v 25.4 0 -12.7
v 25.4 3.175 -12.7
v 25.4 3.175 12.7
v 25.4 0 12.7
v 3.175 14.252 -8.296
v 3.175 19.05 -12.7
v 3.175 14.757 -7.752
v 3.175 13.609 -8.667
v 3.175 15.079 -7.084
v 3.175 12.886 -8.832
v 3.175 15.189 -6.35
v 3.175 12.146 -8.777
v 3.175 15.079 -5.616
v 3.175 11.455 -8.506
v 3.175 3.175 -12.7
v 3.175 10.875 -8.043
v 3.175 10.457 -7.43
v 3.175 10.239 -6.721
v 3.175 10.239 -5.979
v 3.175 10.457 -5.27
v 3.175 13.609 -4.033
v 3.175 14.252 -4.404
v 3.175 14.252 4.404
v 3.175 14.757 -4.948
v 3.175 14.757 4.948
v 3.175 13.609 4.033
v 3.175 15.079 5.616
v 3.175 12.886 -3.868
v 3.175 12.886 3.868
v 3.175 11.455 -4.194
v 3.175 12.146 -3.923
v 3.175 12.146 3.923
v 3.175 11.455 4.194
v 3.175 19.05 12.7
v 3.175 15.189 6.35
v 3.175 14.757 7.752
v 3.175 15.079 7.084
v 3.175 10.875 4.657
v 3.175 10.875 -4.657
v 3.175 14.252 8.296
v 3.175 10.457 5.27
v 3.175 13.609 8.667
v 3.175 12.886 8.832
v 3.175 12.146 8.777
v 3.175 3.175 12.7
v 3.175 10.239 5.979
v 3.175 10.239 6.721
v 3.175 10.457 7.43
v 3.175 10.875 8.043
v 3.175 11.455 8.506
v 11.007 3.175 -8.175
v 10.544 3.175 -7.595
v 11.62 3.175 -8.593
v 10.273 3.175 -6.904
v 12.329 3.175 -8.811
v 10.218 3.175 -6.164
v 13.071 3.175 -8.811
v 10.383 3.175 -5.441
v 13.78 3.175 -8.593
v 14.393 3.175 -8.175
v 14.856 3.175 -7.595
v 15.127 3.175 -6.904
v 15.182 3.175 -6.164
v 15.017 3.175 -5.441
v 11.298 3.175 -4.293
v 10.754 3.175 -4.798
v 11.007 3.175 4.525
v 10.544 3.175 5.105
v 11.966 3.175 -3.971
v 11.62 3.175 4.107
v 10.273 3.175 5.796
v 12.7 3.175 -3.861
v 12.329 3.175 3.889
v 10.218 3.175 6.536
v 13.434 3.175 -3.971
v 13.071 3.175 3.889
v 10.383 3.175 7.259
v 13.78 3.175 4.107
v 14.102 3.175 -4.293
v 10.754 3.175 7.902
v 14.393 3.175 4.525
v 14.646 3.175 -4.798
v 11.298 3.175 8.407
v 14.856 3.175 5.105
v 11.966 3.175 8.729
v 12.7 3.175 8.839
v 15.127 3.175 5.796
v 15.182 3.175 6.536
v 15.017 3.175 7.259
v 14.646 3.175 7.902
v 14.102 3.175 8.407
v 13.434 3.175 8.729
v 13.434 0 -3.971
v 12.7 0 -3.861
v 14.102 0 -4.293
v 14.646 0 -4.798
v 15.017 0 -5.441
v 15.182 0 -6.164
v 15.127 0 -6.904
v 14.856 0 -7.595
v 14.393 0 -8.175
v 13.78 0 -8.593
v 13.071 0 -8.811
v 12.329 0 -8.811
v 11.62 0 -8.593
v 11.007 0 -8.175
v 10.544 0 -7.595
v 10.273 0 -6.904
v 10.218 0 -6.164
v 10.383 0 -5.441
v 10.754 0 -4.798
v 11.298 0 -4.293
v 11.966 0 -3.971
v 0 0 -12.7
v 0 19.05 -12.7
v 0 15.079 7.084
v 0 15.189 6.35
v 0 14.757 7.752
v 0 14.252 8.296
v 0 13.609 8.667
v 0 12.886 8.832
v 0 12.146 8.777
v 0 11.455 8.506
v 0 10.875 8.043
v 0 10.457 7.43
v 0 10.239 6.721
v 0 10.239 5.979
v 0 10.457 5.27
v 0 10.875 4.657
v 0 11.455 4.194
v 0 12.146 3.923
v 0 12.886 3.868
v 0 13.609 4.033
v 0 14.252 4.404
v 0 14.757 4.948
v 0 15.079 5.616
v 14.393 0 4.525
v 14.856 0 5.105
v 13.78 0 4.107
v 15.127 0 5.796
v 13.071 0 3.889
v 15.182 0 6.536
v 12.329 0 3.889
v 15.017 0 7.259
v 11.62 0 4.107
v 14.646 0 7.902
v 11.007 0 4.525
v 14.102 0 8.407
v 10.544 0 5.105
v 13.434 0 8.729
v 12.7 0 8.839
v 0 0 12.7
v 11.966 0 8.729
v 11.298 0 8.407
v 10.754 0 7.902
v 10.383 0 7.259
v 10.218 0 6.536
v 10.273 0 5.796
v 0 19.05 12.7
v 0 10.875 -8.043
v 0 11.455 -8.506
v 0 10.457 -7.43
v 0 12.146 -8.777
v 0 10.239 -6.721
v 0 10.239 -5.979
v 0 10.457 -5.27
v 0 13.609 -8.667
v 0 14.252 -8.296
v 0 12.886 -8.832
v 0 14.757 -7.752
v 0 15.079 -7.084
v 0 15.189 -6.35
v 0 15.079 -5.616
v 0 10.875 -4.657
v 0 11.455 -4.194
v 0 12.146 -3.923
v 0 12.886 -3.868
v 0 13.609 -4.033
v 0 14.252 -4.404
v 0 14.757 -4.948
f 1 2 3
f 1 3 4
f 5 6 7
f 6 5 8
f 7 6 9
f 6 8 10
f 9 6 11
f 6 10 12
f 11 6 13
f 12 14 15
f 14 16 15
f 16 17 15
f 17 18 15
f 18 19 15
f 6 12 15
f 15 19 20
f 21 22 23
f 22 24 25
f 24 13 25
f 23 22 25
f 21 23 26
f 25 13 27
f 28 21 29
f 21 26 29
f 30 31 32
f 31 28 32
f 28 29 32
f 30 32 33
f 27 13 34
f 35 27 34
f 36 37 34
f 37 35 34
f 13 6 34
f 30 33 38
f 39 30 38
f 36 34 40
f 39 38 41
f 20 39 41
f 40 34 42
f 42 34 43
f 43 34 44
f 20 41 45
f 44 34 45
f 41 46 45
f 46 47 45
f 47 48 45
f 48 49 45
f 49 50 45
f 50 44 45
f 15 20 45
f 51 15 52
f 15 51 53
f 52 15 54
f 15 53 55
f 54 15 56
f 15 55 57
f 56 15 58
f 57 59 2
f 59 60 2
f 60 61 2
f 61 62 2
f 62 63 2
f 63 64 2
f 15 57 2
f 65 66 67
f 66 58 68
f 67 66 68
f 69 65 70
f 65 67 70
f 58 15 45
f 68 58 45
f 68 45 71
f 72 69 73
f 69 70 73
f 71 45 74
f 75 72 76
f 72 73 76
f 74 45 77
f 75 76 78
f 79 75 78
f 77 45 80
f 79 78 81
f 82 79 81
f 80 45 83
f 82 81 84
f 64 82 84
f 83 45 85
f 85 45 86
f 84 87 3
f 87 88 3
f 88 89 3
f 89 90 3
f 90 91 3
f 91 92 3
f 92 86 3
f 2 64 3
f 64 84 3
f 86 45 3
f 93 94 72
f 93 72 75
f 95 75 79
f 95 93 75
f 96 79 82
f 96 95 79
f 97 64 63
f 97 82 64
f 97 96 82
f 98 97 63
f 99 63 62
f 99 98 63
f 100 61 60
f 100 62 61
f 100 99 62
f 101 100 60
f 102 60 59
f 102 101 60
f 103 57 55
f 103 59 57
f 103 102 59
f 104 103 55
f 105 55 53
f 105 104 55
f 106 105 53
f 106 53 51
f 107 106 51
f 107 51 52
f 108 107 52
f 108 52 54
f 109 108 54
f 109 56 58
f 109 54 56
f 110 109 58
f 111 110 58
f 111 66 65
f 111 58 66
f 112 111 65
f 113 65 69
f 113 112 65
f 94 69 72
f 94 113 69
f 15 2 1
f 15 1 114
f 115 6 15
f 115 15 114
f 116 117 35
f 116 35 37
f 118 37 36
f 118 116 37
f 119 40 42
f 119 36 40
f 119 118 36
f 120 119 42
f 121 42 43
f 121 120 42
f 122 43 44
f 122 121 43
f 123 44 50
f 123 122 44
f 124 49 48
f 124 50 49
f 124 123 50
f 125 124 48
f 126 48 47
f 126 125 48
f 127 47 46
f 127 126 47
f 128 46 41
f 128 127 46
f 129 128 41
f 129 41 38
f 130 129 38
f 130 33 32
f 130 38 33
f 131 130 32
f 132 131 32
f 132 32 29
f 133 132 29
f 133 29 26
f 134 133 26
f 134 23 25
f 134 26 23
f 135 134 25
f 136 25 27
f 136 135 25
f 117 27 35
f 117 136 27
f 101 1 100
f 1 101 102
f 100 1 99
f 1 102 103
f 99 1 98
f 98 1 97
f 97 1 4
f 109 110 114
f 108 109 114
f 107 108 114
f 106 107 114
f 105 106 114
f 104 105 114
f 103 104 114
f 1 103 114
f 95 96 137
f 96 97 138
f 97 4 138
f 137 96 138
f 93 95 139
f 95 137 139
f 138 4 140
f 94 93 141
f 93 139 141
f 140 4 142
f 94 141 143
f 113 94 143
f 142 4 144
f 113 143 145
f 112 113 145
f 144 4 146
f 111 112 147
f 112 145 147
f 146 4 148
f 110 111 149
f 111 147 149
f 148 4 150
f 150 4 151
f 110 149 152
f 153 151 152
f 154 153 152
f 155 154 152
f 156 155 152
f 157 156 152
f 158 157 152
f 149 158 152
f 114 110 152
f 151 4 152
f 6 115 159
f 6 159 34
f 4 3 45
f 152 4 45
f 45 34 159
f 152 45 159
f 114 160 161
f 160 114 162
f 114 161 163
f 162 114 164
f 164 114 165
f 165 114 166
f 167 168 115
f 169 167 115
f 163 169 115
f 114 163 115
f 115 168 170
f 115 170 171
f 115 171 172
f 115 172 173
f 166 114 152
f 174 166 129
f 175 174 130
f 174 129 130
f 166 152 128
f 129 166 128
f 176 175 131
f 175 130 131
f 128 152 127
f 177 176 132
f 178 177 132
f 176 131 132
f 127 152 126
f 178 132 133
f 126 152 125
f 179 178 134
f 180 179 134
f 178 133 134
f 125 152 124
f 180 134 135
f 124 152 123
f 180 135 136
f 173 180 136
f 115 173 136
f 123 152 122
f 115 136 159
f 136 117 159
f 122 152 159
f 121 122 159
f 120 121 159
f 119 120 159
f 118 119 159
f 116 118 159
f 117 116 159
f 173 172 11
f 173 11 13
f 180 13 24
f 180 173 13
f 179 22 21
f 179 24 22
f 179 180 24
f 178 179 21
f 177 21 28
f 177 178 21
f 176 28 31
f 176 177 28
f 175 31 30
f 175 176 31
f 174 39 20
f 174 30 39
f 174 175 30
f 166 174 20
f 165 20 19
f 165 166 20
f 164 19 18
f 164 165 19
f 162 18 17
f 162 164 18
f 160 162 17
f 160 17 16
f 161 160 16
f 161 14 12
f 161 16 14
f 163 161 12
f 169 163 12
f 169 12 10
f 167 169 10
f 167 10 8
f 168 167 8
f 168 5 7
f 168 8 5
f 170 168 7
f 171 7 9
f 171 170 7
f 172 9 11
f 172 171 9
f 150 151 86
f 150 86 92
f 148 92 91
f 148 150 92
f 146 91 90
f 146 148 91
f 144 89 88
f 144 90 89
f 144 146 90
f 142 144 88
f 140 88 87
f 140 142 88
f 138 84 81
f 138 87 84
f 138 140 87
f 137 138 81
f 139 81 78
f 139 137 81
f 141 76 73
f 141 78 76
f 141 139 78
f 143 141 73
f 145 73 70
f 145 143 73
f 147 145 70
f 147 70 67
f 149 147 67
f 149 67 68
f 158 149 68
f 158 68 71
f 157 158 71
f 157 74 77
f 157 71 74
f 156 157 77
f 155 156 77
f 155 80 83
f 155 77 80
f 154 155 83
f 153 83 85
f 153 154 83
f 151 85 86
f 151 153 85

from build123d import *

# Parameters (mm, degrees)
BOSS_EXTRUDE1_DEPTH     = 12.7
CUT_EXTRUDE1_DEPTH      = 33.534068682
CUT_EXTRUDE1_DEPTH_BACK = 33.534068682
SKETCH3_R               = 2.4892
CUT_EXTRUDE2_DEPTH      = 32.908355097
CUT_EXTRUDE2_DEPTH_BACK = 32.908355097
SKETCH4_R               = 2.4892


with BuildPart() as part:
    # Sketch1 → Boss-Extrude1 (new, symmetric)
    with BuildSketch(Plane.XY):
        Polygon((0, 0), (0, 19.05), (3.175, 19.05), (3.175, 3.175), (25.4, 3.175), (25.4, 0), align=None)
    extrude(amount=BOSS_EXTRUDE1_DEPTH, both=True)

    # Sketch3 → Cut-Extrude1 (cut, two sides: drawn at the far end of the back side and taken through both)
    with BuildSketch(Plane(origin=(0, 3.175, 0), x_dir=(1, 0, 0), z_dir=(0, 1, 0)).offset(-CUT_EXTRUDE1_DEPTH_BACK)):
        with Locations(Location((12.7, -6.35, 0), (0, 0, 270))):
            Circle(SKETCH3_R)
        with Locations(Location((12.7, 6.35, 0), (0, 0, 270))):
            Circle(SKETCH3_R)
    extrude(amount=CUT_EXTRUDE1_DEPTH + CUT_EXTRUDE1_DEPTH_BACK, mode=Mode.SUBTRACT)

    # Sketch4 → Cut-Extrude2 (cut, two sides: drawn at the far end of the back side and taken through both)
    with BuildSketch(Plane(origin=(3.175, 0, 0), x_dir=(0, 0, -1), z_dir=(1, 0, 0)).offset(-CUT_EXTRUDE2_DEPTH_BACK)):
        with Locations(Location((-6.35, 12.7, 0), (0, 0, 90))):
            Circle(SKETCH4_R)
        with Locations(Location((6.35, 12.7, 0), (0, 0, 90))):
            Circle(SKETCH4_R)
    extrude(amount=CUT_EXTRUDE2_DEPTH + CUT_EXTRUDE2_DEPTH_BACK, mode=Mode.SUBTRACT)


solid = part.part
